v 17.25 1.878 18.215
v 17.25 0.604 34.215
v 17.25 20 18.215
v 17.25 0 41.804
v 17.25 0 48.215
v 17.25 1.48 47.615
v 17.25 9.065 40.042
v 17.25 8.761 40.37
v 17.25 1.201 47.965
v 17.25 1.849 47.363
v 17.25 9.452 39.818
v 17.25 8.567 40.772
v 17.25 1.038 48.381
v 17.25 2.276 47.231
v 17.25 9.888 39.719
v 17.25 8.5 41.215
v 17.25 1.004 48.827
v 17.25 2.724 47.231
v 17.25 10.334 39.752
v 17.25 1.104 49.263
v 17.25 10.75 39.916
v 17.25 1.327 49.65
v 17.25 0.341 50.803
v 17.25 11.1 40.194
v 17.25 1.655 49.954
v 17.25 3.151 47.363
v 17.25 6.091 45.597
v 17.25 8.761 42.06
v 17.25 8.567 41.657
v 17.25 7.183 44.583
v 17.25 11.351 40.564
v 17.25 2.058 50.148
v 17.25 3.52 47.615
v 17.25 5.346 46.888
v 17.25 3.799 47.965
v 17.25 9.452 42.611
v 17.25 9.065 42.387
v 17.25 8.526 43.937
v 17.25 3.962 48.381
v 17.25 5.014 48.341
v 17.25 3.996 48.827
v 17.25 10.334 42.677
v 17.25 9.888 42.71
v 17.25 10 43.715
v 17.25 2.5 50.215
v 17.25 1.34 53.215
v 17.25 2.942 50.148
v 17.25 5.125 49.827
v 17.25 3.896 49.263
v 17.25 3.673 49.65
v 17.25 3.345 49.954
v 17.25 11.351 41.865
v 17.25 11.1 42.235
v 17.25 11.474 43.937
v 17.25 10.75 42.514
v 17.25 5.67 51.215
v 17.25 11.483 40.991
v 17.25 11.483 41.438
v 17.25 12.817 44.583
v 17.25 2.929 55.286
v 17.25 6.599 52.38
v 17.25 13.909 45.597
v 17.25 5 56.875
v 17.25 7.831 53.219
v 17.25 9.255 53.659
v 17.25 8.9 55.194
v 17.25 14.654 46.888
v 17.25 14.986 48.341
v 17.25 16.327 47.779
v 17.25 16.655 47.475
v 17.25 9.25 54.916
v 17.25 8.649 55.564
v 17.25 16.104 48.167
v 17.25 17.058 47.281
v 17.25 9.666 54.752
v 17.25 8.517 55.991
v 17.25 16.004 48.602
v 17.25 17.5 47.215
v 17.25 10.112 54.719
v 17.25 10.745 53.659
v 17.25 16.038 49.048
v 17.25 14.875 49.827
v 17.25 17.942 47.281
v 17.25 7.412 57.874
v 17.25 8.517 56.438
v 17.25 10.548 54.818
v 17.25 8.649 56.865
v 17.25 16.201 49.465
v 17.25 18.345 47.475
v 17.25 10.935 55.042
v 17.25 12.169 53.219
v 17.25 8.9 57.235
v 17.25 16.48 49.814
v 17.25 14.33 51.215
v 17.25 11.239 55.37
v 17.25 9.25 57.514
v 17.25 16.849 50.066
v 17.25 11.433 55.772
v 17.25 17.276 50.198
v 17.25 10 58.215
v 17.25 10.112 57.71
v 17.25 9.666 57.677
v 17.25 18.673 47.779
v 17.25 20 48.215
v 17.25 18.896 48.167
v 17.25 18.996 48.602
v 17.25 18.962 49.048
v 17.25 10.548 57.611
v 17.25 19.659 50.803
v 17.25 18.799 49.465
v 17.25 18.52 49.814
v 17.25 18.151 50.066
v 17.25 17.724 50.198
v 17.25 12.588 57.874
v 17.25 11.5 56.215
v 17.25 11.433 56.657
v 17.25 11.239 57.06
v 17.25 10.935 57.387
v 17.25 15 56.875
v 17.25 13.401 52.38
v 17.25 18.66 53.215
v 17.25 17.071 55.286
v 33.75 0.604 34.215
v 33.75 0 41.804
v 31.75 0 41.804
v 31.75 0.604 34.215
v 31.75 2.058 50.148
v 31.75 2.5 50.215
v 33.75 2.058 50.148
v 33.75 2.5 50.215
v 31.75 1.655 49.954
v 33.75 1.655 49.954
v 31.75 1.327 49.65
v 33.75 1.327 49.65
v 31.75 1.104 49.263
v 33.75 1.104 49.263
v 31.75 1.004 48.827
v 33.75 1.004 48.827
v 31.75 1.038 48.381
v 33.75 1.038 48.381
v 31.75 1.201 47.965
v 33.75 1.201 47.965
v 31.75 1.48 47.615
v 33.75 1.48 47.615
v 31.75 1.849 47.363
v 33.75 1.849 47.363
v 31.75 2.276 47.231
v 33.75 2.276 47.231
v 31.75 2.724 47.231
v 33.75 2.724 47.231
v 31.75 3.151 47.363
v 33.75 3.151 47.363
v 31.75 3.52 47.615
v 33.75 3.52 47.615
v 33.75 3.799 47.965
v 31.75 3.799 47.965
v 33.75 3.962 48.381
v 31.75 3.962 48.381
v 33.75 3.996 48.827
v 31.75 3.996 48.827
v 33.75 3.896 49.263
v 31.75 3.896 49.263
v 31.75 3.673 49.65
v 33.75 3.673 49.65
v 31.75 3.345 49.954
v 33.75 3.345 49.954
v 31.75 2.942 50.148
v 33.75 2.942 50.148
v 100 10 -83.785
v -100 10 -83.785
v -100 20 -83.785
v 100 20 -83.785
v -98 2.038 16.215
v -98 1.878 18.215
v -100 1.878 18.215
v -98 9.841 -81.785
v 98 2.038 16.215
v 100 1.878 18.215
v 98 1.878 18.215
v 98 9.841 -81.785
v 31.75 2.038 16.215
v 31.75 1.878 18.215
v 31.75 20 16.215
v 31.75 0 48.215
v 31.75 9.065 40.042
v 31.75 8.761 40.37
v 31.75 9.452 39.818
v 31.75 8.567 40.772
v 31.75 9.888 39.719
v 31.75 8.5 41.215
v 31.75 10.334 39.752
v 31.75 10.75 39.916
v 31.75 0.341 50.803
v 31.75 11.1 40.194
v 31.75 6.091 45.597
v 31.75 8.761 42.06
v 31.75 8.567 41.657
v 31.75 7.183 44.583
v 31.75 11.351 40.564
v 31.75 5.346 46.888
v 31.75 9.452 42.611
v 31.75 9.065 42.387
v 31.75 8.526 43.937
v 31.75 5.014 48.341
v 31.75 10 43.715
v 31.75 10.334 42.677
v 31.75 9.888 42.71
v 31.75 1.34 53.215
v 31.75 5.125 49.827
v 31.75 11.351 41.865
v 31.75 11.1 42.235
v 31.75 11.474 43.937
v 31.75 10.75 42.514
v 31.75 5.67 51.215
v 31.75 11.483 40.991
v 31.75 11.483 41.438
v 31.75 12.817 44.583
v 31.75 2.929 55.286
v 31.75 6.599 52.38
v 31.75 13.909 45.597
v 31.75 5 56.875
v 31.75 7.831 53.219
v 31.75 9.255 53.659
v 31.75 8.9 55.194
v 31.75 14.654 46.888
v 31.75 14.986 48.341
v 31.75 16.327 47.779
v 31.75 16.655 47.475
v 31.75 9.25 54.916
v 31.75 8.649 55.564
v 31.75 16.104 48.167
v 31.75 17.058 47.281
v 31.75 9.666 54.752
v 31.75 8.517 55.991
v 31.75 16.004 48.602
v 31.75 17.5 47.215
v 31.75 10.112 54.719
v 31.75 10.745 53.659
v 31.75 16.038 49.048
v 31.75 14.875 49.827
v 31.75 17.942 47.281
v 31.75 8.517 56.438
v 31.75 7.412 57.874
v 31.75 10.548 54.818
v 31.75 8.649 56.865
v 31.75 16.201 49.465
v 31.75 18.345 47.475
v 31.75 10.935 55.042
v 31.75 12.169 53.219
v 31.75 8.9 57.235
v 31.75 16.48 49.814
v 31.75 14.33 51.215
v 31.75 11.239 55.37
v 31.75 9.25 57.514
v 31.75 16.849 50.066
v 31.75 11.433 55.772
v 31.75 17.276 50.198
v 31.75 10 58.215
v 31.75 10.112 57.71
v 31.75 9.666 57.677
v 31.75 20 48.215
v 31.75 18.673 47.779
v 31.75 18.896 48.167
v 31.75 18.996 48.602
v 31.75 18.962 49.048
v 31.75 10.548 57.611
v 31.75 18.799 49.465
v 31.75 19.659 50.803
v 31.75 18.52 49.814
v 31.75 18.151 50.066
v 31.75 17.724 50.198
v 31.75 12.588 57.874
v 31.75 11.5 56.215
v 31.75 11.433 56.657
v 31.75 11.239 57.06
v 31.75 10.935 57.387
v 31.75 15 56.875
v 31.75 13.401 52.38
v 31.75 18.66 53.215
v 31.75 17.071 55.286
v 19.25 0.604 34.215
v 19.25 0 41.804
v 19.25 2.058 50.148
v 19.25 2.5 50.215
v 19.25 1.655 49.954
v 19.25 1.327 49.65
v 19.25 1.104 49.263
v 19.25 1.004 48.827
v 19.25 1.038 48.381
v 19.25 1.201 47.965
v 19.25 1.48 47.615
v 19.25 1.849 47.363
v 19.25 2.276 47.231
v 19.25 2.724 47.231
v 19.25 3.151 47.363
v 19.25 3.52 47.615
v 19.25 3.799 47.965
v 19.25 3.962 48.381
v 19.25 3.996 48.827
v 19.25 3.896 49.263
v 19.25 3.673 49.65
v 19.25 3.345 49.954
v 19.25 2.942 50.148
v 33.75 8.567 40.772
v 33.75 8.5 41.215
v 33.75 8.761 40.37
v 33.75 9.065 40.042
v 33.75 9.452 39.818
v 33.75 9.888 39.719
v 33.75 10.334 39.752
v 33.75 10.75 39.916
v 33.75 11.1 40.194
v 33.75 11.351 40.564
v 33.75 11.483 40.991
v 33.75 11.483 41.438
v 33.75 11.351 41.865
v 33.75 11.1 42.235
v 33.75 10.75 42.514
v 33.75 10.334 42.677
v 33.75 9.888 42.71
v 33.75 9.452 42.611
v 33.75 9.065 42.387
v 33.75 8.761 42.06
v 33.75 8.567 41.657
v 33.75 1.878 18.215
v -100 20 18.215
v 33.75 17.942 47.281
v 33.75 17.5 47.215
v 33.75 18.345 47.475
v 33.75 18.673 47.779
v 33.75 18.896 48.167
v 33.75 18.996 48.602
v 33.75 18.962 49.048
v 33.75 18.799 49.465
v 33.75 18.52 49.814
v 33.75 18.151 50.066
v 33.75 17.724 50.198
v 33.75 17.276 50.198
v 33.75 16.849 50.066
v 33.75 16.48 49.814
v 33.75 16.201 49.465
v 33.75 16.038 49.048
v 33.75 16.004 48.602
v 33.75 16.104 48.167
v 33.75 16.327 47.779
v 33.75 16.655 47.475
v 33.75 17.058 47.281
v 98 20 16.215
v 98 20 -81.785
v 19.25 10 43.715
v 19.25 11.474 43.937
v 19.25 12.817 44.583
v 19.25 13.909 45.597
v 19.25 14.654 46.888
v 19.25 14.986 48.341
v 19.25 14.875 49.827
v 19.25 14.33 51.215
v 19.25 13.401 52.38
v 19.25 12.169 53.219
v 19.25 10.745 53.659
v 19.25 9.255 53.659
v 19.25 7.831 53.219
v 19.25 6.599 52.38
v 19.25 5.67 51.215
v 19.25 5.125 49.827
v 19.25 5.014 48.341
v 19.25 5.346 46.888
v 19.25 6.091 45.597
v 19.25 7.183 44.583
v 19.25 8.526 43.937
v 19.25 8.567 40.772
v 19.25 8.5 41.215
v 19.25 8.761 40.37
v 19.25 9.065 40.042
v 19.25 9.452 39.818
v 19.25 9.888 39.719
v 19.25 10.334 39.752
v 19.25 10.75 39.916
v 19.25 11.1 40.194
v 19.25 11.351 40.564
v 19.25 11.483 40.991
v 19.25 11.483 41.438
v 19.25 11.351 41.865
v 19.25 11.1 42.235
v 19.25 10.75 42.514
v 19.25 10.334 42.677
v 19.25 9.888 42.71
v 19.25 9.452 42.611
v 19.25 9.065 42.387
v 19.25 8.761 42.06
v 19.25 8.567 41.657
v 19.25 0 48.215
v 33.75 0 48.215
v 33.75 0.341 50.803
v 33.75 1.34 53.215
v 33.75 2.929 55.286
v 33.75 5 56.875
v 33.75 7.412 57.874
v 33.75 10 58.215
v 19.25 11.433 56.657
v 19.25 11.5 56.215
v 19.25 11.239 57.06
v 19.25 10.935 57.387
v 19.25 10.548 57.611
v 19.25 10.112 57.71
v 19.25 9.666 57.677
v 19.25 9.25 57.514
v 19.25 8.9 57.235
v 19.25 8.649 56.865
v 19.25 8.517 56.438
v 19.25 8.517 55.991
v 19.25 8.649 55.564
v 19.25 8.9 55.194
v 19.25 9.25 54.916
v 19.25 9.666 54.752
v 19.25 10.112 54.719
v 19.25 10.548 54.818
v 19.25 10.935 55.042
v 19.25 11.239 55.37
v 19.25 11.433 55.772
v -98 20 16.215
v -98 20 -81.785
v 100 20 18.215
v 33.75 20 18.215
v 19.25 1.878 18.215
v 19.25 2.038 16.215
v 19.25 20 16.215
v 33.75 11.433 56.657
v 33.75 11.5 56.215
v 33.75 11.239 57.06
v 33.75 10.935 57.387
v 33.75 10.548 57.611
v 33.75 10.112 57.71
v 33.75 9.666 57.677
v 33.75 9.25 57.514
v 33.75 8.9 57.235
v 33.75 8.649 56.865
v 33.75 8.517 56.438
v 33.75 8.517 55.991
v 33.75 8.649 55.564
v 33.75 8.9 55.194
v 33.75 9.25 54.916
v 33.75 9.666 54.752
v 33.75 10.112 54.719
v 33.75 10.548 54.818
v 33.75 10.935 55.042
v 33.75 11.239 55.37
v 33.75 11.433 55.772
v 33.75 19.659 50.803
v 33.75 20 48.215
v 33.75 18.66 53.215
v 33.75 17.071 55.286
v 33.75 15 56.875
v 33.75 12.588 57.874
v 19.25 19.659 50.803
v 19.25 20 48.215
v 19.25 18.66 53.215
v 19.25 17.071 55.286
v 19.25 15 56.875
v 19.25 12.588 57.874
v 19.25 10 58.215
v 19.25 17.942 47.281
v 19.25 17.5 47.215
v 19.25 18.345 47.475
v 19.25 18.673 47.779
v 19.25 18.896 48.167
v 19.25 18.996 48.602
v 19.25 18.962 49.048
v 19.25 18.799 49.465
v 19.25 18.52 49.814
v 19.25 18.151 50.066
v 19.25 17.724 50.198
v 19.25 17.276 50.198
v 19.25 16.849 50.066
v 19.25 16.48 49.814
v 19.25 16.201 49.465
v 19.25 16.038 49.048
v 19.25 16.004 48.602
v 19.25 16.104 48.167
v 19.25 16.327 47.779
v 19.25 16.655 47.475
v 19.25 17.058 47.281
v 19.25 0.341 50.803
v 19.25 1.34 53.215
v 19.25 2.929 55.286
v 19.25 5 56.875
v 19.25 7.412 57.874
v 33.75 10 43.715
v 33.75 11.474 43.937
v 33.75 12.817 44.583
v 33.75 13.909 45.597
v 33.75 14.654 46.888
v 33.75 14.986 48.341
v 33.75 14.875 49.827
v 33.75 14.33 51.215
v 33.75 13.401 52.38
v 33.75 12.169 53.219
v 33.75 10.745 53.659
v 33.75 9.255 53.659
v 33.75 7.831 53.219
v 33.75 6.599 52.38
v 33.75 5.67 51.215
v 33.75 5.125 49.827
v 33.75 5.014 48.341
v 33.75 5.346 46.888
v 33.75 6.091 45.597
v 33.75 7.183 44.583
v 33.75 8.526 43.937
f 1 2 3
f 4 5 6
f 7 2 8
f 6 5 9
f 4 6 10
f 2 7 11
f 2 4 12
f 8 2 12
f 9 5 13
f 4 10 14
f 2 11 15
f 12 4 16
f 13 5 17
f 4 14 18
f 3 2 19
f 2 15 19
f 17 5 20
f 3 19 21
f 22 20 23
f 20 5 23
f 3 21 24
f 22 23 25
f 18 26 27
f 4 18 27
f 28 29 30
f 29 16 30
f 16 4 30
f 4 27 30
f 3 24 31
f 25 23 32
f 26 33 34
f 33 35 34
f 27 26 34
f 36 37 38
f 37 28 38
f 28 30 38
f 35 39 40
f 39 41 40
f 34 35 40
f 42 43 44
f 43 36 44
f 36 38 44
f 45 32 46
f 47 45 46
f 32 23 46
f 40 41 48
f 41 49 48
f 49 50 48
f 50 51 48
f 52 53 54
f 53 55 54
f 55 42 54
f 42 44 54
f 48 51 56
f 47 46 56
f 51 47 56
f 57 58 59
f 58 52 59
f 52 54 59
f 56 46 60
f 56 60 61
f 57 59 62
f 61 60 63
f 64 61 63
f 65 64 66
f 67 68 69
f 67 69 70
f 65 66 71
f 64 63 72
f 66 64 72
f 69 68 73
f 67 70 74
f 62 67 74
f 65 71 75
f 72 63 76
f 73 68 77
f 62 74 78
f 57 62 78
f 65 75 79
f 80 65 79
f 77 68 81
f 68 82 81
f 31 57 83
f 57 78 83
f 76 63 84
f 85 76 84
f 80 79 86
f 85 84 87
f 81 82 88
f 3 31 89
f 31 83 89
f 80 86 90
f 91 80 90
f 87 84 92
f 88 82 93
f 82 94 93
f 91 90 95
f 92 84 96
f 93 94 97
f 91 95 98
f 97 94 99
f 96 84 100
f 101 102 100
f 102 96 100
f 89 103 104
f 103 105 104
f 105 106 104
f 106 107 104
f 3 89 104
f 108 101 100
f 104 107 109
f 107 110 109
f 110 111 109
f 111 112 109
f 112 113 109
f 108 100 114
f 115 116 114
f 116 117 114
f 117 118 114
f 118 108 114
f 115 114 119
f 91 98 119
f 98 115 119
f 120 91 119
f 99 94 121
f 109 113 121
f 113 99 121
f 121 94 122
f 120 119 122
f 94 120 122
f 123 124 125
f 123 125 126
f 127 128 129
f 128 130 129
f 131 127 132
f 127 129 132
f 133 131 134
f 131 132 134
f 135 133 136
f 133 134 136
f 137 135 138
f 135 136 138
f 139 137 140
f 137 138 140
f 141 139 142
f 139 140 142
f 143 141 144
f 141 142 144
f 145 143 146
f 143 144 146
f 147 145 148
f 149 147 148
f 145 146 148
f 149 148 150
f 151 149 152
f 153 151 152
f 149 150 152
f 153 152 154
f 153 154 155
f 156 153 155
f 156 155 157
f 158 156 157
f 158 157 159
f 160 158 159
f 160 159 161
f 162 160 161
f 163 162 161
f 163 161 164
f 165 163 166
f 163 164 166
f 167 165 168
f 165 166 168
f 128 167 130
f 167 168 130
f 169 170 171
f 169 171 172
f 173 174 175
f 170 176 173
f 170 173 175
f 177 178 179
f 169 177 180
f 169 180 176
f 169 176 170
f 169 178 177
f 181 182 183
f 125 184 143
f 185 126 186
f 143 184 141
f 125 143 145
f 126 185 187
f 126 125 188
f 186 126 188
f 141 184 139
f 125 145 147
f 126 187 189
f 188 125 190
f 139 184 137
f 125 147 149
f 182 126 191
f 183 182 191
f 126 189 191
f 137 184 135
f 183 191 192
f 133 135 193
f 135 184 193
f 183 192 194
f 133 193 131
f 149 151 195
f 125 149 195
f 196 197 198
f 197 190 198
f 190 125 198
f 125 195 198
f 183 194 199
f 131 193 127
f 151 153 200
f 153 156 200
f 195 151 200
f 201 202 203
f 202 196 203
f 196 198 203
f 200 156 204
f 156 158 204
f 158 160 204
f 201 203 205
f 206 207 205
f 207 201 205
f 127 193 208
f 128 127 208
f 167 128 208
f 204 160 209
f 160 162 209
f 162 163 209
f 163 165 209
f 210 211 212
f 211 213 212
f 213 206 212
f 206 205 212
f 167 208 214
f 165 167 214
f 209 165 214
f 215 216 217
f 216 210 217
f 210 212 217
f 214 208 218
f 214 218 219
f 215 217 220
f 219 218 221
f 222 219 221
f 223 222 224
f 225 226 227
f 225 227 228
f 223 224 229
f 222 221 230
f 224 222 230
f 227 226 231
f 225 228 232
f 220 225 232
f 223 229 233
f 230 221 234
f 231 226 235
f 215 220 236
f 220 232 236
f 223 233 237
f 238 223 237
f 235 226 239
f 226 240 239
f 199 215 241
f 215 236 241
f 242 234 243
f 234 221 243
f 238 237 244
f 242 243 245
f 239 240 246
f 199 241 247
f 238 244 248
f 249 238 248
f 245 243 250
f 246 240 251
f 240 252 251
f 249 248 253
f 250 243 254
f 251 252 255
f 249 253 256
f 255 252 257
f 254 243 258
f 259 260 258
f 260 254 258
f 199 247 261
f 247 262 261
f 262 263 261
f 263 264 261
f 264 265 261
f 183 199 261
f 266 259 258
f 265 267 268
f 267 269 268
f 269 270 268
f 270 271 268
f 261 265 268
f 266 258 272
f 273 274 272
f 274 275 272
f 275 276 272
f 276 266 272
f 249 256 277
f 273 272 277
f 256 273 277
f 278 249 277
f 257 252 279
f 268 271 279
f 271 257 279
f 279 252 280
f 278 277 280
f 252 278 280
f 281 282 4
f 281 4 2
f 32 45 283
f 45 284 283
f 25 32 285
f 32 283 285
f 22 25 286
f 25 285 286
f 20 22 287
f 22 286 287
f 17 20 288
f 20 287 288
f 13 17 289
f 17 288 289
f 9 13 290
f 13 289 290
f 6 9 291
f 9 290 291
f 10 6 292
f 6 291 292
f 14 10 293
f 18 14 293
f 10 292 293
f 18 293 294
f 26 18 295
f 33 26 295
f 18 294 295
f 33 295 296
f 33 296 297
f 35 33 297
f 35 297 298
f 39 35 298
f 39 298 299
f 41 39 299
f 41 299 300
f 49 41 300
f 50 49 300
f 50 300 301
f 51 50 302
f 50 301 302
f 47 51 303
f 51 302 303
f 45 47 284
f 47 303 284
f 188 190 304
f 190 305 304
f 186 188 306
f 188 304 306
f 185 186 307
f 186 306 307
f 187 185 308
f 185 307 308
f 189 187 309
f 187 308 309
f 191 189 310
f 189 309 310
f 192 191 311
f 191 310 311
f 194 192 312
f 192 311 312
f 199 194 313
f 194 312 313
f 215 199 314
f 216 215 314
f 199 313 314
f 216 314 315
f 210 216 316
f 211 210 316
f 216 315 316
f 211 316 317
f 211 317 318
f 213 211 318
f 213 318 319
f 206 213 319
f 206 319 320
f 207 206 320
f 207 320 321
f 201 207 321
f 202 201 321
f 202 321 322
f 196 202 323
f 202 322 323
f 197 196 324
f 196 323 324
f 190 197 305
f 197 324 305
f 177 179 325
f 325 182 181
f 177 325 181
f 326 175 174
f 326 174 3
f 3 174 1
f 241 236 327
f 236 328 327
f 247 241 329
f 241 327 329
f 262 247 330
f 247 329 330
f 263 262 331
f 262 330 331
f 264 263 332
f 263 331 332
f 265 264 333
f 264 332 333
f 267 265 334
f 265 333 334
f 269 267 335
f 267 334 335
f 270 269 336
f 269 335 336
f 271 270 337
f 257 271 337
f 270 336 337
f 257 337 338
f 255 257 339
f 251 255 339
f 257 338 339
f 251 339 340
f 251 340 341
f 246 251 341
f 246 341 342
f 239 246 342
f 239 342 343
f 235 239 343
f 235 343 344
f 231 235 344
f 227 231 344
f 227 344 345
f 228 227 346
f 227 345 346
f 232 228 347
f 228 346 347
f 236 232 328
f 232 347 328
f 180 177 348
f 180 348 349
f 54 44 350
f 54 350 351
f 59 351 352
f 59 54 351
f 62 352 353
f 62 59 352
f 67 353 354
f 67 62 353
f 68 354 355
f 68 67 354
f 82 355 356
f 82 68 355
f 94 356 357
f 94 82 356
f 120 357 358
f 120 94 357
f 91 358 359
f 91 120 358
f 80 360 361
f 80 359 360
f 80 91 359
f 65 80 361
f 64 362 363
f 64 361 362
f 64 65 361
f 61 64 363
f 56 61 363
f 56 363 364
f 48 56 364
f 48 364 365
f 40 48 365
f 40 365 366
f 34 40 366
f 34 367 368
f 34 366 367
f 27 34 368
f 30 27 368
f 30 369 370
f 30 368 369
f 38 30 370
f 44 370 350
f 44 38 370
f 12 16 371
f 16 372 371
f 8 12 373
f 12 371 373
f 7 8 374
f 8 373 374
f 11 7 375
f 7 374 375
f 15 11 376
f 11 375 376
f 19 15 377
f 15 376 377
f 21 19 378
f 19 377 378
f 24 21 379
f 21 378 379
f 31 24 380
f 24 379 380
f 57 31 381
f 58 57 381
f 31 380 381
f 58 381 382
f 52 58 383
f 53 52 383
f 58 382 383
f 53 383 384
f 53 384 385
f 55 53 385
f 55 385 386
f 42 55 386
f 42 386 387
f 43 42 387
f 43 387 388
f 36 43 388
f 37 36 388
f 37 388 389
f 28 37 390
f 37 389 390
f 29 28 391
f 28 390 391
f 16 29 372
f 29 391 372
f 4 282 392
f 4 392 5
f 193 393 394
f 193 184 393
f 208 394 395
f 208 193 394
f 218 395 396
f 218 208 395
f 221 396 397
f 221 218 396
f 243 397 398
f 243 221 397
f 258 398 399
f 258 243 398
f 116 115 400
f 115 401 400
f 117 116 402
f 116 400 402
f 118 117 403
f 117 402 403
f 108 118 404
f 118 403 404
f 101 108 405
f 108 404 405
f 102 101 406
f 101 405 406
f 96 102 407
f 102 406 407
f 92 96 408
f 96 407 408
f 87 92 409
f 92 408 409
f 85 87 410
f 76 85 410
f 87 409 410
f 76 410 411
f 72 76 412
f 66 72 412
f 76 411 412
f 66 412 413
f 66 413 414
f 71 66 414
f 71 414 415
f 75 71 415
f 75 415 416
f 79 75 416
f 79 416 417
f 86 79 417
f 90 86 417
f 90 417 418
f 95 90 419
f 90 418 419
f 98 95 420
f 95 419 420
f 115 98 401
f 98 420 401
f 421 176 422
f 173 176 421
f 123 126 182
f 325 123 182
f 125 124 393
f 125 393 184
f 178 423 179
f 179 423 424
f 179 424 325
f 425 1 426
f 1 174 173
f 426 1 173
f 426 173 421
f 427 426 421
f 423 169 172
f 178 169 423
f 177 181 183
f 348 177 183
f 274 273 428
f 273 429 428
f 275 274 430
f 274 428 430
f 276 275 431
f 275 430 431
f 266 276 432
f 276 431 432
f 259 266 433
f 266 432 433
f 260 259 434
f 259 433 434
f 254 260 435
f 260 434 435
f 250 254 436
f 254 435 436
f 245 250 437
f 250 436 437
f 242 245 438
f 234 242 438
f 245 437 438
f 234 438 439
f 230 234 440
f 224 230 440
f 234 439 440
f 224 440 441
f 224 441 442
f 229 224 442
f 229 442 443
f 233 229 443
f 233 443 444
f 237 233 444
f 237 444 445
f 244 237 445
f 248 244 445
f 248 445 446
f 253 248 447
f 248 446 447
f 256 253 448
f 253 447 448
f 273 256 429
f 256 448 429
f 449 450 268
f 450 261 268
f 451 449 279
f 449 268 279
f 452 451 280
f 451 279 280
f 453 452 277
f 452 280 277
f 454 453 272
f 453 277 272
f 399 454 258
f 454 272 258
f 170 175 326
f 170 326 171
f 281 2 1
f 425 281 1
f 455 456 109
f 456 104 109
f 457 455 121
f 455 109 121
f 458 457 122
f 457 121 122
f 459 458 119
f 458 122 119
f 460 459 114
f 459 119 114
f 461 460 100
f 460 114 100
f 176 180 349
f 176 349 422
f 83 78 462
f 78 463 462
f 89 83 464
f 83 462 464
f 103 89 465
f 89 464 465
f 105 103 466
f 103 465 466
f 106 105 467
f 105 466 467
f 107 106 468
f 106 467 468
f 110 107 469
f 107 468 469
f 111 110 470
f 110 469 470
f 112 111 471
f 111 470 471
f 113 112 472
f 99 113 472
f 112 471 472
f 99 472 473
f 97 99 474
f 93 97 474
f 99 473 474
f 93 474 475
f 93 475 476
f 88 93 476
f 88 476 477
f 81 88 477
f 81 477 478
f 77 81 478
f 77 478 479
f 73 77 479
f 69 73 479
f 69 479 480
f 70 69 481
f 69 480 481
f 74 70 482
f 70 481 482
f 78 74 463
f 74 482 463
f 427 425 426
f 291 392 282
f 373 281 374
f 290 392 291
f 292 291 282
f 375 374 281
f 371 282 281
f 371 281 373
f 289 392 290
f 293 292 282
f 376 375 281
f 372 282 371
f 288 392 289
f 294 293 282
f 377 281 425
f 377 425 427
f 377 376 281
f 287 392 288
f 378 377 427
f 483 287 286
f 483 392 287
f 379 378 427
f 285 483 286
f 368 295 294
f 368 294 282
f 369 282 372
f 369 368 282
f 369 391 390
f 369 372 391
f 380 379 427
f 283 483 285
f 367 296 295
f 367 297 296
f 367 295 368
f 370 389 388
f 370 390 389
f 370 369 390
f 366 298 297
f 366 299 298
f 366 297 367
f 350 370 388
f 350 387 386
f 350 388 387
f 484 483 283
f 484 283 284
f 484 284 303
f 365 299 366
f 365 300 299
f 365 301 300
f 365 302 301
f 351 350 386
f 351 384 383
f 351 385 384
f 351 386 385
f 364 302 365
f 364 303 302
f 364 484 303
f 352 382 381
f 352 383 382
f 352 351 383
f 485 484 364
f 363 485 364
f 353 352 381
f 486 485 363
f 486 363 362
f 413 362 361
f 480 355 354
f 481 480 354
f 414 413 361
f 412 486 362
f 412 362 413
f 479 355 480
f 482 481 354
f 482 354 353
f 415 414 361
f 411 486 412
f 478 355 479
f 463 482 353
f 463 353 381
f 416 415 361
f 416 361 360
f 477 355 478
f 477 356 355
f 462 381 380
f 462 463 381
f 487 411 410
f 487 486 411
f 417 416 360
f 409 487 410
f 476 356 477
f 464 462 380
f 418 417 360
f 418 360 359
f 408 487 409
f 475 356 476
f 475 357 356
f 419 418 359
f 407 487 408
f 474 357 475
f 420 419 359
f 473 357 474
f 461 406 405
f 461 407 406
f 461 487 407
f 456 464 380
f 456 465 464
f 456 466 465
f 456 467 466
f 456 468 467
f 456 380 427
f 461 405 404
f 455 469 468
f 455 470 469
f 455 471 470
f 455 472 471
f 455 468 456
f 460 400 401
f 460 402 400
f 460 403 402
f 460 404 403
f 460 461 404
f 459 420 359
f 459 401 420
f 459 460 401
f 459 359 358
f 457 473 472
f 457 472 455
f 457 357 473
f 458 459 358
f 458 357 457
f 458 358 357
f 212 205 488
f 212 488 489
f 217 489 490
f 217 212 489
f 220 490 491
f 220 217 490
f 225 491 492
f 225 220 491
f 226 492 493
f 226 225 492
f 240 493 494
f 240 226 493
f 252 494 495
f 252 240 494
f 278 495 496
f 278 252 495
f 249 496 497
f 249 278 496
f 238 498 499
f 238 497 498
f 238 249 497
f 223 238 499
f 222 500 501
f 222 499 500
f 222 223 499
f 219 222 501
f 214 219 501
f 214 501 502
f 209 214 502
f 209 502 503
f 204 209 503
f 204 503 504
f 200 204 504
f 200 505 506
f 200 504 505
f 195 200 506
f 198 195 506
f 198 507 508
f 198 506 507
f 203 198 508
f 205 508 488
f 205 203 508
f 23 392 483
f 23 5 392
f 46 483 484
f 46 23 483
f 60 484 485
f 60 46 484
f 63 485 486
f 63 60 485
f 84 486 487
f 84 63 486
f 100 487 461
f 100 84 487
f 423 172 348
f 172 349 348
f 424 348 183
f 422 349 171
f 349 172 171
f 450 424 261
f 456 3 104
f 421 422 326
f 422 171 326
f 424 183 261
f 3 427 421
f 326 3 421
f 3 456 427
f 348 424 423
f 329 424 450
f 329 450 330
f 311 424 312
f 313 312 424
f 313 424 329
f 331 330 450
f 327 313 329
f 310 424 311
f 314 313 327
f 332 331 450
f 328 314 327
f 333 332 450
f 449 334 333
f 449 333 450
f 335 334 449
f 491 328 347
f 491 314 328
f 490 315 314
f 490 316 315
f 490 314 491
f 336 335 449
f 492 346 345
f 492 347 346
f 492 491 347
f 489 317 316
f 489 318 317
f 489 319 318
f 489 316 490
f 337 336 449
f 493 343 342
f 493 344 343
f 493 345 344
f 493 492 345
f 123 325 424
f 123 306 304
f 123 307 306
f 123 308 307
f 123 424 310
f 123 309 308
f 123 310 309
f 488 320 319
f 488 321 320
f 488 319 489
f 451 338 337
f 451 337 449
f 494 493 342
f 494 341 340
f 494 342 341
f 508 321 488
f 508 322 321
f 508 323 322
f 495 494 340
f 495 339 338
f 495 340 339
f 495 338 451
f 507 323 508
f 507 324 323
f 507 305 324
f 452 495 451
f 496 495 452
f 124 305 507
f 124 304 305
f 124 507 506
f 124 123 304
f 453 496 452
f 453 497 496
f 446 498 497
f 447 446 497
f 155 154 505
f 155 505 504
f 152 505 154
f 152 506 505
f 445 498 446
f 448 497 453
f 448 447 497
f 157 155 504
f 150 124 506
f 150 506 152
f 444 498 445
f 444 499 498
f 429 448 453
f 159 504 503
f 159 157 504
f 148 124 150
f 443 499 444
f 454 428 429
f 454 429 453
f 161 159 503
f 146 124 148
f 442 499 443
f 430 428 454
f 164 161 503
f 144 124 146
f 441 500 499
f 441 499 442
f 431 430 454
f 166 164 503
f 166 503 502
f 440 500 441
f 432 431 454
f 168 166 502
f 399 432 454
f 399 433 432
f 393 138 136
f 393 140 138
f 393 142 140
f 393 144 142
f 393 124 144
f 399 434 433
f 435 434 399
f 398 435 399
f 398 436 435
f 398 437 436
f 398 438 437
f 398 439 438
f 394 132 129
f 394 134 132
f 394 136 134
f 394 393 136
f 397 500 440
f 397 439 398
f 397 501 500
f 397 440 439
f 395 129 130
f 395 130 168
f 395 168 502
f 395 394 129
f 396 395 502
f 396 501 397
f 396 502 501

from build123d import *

# Parameters (mm, degrees)
EXTRUDE_1_DEPTH          = 20
CUT_EXTRUDE_1_DEPTH      = 160.088219443
CUT_EXTRUDE_1_DEPTH_BACK = 160.088219443
SKETCH_6_R               = 5
SKETCH_6_3_R             = 1.5
CUT_EXTRUDE_2_DEPTH      = 160.088219443
PATTERN_CIRCULAR_1_COUNT = 4
FILLET_1_R               = 10
CUT_EXTRUDE_3_DEPTH      = 218.761335102
CUT_EXTRUDE_3_DEPTH_BACK = 218.761335102
EXTRUDE_START            = -98
EXTRUDE_2_DEPTH          = 117.25
EXTRUDE_START_2          = 31.75
EXTRUDE_2_2_DEPTH        = 66.25
EXTRUDE_START_3          = 17.25
EXTRUDE_2_3_DEPTH        = 2
EXTRUDE_2_4_DEPTH        = 2
CUT_EXTRUDE_4_DEPTH      = 132.984844075
CUT_EXTRUDE_4_DEPTH_BACK = 132.984844075
SKETCH_12_W              = 119.060862832
SKETCH_12_H              = 18
SKETCH_12_W_2            = 69.668977306


# Read off the part's stored shape, not the designer's step: 凸台-拉伸2
with BuildPart() as part:
    # 草图2 → 凸台-拉伸1 (new body)
    with BuildSketch(Plane(origin=(0, 0, 0), x_dir=(1, 0, 0), z_dir=(0, 1, 0))):
        Polygon((17.25, -36.214565314), (-100, -36.214565314), (-100, 83.785434686), (100, 83.785434686), (100, -36.214565314), (33.75, -36.214565314), (33.75, -58.214565314), (31.75, -58.214565314), (31.75, -34.214565314), (98, -34.214565314), (98, 81.785434686), (-98, 81.785434686), (-98, -34.214565314), (19.25, -34.214565314), (19.25, -58.214565314), (17.25, -58.214565314), align=None)
    extrude(amount=EXTRUDE_1_DEPTH)

    # 草图6 → 切除-拉伸1 (cut, two sides: drawn at the far end of the back side and taken through both)
    with BuildSketch(Plane(origin=(33.75, 0, 0), x_dir=(0, 0, -1), z_dir=(1, 0, 0)).offset(-CUT_EXTRUDE_1_DEPTH_BACK)):
        with Locations((-48.714565314, 10)):
            Circle(SKETCH_6_R)
    extrude(amount=CUT_EXTRUDE_1_DEPTH + CUT_EXTRUDE_1_DEPTH_BACK, mode=Mode.SUBTRACT)

    # 草图6<3> → 切除-拉伸2 (cut, symmetric)
    with BuildSketch(Plane(origin=(33.75, 0, 0), x_dir=(0, 0, -1), z_dir=(1, 0, 0))):
        with Locations((-48.714565314, 17.5)):
            Circle(SKETCH_6_3_R)
    cut_extrude_2 = extrude(amount=CUT_EXTRUDE_2_DEPTH, both=True, mode=Mode.SUBTRACT)

    # 阵列(圆周)1: 切除-拉伸2 ×4 about axis
    pattern_circular_1_axis = Axis((0, 10, 48.714565314), (1, 0, 0))
    for i in range(1, PATTERN_CIRCULAR_1_COUNT):
        add(cut_extrude_2.rotate(pattern_circular_1_axis, i * 360 / PATTERN_CIRCULAR_1_COUNT), mode=Mode.SUBTRACT)

    # 圆角1
    fillet_1_edges = [part.edges().sort_by_distance(p)[0] for p in [
        (32.75, 20, 58.214565314),
        (32.75, 0, 58.214565314),
        (18.25, 0, 58.214565314),
        (18.25, 20, 58.214565314),
    ]]
    fillet(fillet_1_edges, radius=FILLET_1_R - 0.0001)  # a hair under: the kernel refuses the full size

    # 草图8 → 切除-拉伸3 (cut, two sides: drawn at the far end of the back side and taken through both)
    with BuildSketch(Plane.ZY.offset(100).offset(-CUT_EXTRUDE_3_DEPTH_BACK)):
        Polygon((41.803939726, 0), (-83.785434686, 10), (-83.785434686, 0), align=None)
    extrude(amount=CUT_EXTRUDE_3_DEPTH + CUT_EXTRUDE_3_DEPTH_BACK, mode=Mode.SUBTRACT)

    # 凸台-拉伸2 outline → 凸台-拉伸2 (add)
    with BuildSketch(Plane.YZ.offset(EXTRUDE_START)):
        Polygon((20, 16.214565314), (20, 18.214565314), (1.878293807, 18.214565314), (2.037542948, 16.214565314), align=None)
    extrude(amount=EXTRUDE_2_DEPTH)

    # Extrude 2 2 outline → Extrude 2 2 (add)
    with BuildSketch(Plane.YZ.offset(EXTRUDE_START_2)):
        Polygon((20, 16.214565314), (20, 18.214565314), (1.878293807, 18.214565314), (2.037542948, 16.214565314), align=None)
    extrude(amount=EXTRUDE_2_2_DEPTH)

    # Extrude 2 3 outline → Extrude 2 3 (add)
    with BuildSketch(Plane.YZ.offset(EXTRUDE_START_3)):
        Polygon((20, 18.214565314), (20, 34.214565314), (0.604300678, 34.214565314), (1.878293807, 18.214565314), align=None)
    extrude(amount=EXTRUDE_2_3_DEPTH)

    # Extrude 2 4 outline → Extrude 2 4 (add)
    with BuildSketch(Plane.YZ.offset(EXTRUDE_START_2)):
        Polygon((20, 18.214565314), (20, 34.214565314), (0.604300678, 34.214565314), (1.878293807, 18.214565314), align=None)
    extrude(amount=EXTRUDE_2_4_DEPTH)

    # 草图12 → 切除-拉伸4 (cut, two sides: drawn at the far end of the back side and taken through both)
    with BuildSketch(Plane(origin=(0, 0, 0), x_dir=(1, 0, 0), z_dir=(0, 1, 0)).offset(-CUT_EXTRUDE_4_DEPTH_BACK)):
        with Locations((-42.280431416, -27.214565314)):
            Rectangle(SKETCH_12_W, SKETCH_12_H)
        with Locations((68.584488653, -27.214565314)):
            Rectangle(SKETCH_12_W_2, SKETCH_12_H)
    extrude(amount=CUT_EXTRUDE_4_DEPTH + CUT_EXTRUDE_4_DEPTH_BACK, mode=Mode.SUBTRACT)


solid = part.part
